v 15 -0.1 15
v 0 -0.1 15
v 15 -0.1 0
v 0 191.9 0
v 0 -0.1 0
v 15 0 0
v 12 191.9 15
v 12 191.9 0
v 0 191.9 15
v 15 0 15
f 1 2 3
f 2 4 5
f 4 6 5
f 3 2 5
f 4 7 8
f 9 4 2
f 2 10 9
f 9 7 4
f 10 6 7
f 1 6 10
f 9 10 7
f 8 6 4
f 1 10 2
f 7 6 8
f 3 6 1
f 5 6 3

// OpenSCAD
//approximation of the ends
length=192;
height=15;
end1W=15;
end2W=12;
wiggle=.1;
hull(){
    rotate([90,0,0]) cube([end1W,height,wiggle]);
    translate([0,length-wiggle,0]) rotate([90,0,0]) cube([end2W,height,wiggle]);
}
